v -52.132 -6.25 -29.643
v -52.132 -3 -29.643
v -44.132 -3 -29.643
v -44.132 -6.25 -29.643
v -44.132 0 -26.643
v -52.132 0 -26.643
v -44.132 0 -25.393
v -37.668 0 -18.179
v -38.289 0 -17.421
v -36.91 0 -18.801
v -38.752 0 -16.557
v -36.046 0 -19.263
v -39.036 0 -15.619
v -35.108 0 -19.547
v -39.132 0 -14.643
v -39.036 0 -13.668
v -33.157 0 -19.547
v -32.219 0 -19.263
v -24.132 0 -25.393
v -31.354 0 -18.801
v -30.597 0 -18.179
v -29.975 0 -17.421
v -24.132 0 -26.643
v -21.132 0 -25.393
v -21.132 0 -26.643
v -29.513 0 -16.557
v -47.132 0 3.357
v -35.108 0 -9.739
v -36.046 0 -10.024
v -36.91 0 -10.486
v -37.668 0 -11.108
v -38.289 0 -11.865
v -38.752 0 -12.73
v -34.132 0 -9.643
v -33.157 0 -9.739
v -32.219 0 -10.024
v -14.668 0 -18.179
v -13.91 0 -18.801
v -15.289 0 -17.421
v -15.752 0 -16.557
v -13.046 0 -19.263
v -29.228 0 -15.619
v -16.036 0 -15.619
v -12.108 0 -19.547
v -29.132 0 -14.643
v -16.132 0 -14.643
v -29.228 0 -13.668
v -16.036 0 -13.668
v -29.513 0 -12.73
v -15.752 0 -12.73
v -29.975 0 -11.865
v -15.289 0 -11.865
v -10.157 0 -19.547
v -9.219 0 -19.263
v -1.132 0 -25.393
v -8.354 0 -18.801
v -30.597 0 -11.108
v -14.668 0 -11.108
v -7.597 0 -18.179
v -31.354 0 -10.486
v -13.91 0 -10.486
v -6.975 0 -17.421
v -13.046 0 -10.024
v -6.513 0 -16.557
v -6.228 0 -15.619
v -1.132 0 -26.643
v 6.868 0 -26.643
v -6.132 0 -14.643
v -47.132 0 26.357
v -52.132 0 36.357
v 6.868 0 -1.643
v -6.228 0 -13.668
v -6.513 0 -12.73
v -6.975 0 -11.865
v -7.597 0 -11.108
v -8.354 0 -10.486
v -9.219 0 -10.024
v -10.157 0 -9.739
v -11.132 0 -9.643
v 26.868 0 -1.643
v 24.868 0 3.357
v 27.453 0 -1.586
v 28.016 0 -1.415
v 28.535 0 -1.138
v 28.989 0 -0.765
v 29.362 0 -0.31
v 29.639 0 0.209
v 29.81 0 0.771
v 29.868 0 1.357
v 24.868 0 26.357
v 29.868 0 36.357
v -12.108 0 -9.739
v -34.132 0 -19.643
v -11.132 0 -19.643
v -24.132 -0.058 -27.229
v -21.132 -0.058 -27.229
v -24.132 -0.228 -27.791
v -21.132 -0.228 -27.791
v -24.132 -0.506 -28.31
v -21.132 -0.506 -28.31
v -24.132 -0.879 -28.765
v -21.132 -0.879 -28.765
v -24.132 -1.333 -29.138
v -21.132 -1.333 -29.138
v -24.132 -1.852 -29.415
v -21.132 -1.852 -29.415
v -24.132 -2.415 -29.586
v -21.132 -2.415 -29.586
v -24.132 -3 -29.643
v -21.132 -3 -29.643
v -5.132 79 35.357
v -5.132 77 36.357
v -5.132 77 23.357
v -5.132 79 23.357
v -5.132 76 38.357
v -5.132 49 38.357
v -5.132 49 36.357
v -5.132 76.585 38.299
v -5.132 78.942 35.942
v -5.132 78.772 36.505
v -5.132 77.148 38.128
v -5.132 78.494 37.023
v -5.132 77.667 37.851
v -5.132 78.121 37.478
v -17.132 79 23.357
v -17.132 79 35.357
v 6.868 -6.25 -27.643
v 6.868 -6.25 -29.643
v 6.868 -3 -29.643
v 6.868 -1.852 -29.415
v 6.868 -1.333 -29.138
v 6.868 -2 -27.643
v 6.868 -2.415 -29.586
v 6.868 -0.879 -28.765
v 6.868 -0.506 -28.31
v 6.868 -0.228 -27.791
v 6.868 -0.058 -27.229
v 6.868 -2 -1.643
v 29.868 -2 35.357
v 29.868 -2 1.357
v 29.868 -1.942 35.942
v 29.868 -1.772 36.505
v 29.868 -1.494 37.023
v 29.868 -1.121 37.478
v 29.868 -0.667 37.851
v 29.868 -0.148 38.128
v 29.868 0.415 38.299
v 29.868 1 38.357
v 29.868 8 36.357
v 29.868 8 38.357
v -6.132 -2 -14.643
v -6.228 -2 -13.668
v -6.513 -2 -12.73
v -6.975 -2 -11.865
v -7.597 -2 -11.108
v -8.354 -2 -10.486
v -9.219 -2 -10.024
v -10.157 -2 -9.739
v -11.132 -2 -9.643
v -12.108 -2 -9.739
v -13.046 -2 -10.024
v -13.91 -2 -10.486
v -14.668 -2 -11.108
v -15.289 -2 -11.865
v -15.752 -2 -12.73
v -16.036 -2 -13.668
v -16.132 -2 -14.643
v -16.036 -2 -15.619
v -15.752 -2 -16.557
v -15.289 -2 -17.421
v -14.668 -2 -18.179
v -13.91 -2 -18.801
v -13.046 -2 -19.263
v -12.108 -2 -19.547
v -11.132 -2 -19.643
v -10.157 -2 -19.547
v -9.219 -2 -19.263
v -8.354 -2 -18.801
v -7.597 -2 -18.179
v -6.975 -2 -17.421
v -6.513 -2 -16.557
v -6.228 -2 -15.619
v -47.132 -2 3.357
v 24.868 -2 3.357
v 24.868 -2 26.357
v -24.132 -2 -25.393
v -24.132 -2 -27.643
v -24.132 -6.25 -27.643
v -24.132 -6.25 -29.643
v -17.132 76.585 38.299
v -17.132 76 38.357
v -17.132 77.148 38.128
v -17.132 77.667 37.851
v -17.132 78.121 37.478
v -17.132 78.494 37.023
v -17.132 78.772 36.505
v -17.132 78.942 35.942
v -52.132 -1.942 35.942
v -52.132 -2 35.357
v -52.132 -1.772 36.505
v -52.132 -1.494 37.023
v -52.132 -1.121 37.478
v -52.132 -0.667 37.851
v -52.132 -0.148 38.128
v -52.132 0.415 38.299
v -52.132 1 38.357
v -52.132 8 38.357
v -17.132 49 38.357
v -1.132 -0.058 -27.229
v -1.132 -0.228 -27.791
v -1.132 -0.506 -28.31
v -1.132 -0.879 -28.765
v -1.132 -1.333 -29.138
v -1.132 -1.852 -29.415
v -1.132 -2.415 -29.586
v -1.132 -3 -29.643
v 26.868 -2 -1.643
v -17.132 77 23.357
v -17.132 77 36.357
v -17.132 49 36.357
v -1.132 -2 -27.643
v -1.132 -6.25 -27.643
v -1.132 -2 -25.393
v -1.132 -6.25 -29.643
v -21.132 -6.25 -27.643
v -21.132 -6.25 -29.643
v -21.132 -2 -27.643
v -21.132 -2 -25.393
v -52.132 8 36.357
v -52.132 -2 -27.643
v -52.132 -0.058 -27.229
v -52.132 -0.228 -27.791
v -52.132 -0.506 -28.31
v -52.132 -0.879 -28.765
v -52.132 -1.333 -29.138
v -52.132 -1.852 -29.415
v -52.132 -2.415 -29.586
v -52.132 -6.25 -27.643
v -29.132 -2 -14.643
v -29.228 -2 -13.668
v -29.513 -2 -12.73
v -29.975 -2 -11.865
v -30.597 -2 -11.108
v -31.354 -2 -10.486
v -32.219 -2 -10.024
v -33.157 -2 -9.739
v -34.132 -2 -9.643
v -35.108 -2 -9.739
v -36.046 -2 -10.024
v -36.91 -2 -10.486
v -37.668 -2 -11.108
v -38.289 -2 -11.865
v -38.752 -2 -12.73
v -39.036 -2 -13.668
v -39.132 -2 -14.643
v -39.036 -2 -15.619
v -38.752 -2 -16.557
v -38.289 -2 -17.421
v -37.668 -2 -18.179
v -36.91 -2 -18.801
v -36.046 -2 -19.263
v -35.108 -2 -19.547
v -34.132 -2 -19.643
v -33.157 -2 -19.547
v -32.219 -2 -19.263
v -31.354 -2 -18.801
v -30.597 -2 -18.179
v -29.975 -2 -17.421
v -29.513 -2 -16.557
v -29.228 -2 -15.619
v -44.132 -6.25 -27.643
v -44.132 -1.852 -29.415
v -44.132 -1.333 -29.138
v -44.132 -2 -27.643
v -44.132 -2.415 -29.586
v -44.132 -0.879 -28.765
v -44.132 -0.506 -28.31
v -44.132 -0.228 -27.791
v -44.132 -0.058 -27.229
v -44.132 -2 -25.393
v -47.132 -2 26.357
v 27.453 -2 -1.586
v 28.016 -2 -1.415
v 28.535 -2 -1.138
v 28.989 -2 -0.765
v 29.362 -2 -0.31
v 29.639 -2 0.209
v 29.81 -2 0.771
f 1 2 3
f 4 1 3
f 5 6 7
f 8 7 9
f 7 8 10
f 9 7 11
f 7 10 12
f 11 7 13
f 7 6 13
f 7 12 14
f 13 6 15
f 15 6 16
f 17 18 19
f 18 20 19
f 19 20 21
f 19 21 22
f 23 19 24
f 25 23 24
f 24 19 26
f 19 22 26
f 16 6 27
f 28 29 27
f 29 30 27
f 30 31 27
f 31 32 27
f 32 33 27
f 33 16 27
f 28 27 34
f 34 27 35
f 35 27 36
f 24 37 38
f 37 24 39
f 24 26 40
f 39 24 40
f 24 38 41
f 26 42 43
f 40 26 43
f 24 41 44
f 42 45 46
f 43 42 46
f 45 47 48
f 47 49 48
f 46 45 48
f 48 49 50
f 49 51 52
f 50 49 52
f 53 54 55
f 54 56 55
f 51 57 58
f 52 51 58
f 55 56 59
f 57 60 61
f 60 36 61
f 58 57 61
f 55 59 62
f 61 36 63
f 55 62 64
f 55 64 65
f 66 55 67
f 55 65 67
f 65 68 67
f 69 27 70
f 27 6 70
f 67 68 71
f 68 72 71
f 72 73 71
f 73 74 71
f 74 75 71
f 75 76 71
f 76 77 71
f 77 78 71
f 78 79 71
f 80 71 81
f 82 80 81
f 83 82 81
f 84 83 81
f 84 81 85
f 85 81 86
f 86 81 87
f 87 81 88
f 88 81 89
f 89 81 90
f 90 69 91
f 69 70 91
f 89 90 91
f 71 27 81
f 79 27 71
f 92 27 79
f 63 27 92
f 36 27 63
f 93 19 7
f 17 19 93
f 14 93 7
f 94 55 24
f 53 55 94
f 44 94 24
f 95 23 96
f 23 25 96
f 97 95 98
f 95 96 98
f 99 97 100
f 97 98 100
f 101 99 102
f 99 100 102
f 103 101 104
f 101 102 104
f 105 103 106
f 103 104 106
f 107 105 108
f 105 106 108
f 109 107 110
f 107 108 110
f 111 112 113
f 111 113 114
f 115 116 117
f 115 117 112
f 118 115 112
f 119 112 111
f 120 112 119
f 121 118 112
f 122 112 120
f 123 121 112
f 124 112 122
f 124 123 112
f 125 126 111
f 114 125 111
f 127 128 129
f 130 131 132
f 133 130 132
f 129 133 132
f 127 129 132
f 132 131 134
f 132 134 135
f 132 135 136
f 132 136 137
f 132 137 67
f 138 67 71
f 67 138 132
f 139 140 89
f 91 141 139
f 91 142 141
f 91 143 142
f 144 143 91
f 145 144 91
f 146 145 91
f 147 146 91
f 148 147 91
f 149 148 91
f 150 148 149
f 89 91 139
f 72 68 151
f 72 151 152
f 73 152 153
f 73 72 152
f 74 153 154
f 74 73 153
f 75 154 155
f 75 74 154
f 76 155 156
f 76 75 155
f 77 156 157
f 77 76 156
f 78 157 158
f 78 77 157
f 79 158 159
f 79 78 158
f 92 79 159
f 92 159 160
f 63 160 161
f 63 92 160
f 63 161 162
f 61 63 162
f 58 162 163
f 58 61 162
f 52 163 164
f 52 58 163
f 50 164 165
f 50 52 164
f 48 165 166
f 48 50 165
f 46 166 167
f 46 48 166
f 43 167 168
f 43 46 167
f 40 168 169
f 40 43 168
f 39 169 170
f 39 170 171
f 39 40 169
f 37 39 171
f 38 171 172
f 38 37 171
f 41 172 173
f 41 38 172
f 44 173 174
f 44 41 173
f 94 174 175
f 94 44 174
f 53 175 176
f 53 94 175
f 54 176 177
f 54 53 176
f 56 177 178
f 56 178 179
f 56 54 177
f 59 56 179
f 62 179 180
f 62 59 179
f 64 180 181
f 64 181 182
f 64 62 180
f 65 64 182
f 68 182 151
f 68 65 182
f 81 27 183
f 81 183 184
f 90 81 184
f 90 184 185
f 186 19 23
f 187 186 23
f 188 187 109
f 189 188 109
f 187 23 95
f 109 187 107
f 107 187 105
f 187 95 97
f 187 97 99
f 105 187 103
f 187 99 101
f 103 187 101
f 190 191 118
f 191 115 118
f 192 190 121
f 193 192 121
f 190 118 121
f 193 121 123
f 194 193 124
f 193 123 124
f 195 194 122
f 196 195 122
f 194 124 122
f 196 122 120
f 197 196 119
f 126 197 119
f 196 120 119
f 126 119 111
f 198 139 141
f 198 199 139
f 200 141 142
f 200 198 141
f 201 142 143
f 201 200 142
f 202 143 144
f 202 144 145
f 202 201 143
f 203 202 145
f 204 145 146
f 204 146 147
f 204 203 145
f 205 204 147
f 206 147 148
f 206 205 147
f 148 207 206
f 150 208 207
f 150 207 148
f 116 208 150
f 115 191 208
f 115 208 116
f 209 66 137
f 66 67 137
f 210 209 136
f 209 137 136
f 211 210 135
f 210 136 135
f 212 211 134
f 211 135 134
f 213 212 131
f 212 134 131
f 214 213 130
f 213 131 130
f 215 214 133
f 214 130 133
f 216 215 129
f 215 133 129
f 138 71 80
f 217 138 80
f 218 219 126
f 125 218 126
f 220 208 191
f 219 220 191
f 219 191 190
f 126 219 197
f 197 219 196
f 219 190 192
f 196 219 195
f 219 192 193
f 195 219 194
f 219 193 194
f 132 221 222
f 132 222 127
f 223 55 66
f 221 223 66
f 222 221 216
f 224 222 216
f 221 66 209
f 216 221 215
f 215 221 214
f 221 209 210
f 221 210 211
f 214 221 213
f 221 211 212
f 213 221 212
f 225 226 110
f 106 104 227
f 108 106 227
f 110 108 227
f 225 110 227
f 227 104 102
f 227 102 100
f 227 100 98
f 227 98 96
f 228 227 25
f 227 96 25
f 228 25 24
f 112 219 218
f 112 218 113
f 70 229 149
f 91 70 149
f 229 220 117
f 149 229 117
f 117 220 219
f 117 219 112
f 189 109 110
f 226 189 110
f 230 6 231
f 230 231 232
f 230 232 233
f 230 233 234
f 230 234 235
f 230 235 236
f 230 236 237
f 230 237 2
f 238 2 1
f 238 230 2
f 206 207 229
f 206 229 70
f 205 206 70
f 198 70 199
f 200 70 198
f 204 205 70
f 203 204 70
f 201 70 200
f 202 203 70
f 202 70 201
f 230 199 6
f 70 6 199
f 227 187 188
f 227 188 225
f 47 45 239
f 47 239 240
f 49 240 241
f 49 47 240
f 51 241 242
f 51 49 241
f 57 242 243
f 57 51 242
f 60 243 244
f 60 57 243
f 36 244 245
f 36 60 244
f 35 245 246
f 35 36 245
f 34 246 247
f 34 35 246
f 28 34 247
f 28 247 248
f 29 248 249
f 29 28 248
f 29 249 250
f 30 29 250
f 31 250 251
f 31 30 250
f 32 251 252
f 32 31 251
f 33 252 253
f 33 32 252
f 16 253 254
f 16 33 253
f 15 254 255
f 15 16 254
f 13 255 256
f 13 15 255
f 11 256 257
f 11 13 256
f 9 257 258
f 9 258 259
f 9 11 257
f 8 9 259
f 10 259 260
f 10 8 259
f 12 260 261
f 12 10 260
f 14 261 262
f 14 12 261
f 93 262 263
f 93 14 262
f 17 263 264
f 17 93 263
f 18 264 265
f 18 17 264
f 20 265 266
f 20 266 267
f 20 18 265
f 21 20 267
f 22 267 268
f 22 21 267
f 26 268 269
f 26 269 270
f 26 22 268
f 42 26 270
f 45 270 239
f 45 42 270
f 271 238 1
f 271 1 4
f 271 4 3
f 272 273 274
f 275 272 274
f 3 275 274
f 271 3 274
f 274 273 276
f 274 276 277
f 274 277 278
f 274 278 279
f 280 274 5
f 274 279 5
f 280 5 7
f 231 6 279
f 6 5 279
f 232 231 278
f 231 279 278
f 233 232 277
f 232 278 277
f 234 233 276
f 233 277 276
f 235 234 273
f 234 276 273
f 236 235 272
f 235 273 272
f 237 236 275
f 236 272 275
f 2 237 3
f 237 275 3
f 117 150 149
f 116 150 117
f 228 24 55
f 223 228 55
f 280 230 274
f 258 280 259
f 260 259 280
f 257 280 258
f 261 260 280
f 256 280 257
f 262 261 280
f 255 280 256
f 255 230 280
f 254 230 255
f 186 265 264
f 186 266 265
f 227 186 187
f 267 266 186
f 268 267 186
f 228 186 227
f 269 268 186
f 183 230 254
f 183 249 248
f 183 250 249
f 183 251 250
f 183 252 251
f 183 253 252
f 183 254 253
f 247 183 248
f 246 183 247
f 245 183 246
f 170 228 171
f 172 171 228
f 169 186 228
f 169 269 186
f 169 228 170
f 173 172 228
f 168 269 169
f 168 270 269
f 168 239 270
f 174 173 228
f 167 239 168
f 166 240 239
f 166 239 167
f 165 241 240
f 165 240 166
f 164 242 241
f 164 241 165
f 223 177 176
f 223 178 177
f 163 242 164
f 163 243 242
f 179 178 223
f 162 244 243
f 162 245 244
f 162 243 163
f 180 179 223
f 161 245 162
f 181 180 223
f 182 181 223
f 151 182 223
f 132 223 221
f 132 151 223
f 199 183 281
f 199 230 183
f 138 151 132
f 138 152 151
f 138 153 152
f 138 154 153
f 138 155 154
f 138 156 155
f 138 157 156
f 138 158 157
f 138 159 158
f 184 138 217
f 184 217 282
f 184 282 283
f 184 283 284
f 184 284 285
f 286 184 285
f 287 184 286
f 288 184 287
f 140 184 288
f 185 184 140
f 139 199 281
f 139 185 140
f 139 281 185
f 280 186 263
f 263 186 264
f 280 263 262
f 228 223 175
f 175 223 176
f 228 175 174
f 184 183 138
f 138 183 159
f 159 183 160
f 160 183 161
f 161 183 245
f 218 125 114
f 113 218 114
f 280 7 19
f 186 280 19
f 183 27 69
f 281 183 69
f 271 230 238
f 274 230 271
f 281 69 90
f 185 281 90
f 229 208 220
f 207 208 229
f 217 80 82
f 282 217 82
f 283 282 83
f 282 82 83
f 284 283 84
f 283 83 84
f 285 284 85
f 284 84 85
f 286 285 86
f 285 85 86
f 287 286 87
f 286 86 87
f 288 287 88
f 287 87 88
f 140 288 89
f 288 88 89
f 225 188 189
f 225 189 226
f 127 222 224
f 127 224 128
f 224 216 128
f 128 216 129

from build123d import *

# Parameters (mm, degrees)
F0_R     = 5
F0_W     = 72
F0_H     = 23
F1_DEPTH = 2
F0_W_2   = 8
F0_H_2   = 2
F0_W_3   = 3
F2_DEPTH = 6.25
F3_R     = 3
F5_DEPTH = 2
F4_W     = 12
F4_H     = 2
F6_DEPTH = 15
F7_R     = 3


with BuildPart() as f1:
    # F0 (on Front) → F1 (new body)
    with BuildSketch(Plane.XZ):
        with BuildLine():
            Line((29.867854, 38.356669), (-52.132146, 38.356669))
            Line((-52.132146, 38.356669), (-52.132146, -27.643331))
            Line((-52.132146, -27.643331), (-44.132146, -27.643331))
            Line((-44.132146, -27.643331), (-44.132146, -25.393331))
            Line((-44.132146, -25.393331), (-24.132146, -25.393331))
            Line((-24.132146, -25.393331), (-24.132146, -27.643331))
            Line((-24.132146, -27.643331), (-21.132146, -27.643331))
            Line((-21.132146, -27.643331), (-21.132146, -25.393331))
            Line((-21.132146, -25.393331), (-1.132146, -25.393331))
            Line((-1.132146, -25.393331), (-1.132146, -27.643331))
            Line((-1.132146, -27.643331), (6.867854, -27.643331))
            Line((6.867854, -27.643331), (6.867854, -1.643331))
            Line((6.867854, -1.643331), (26.867854, -1.643331))
            ThreePointArc((26.867854, -1.643331), (28.989174, -0.764651), (29.867854, 1.356669))
            Line((29.867854, 1.356669), (29.867854, 38.356669))
        make_face()
        with Locations((-34.132146, -14.643331)):
            Circle(F0_R, mode=Mode.SUBTRACT)
        with Locations((-11.132146, -14.643331)):
            Circle(F0_R, mode=Mode.SUBTRACT)
        with Locations((-11.132146, 14.856669)):
            Rectangle(F0_W, F0_H, mode=Mode.SUBTRACT)
    extrude(amount=F1_DEPTH)

    # F0 (on Front) → F2 (join)
    with BuildSketch(Plane.XZ):
        with Locations((-48.132146, -28.643331)):
            Rectangle(F0_W_2, F0_H_2)
        with Locations((-22.632146, -28.643331)):
            Rectangle(F0_W_3, F0_H_2)
        with Locations((2.867854, -28.643331)):
            Rectangle(F0_W_2, F0_H_2)
    extrude(amount=F2_DEPTH)

    # F3
    f3_edges = [f1.edges().sort_by_distance(p)[0] for p in [
        (-48.132146, 0, -29.643331),
        (-22.632146, 0, -29.643331),
        (2.867854, 0, -29.643331),
    ]]
    fillet(f3_edges, radius=F3_R)

    # F4 (on face) → F5 (join)
    with BuildSketch(Plane.XY.offset(38.356669)):
        Polygon((-52.132146, 8), (-52.132146, 0), (29.867854, 0), (29.867854, 8), (-5.132146, 49), (-5.132146, 77), (-17.132146, 77), (-17.132146, 49), align=None)
    extrude(amount=-F5_DEPTH)

    # F4 (on face) → F6 (join)
    with BuildSketch(Plane.XY.offset(38.356669)):
        with Locations((-11.132146, 78)):
            Rectangle(F4_W, F4_H)
    extrude(amount=-F6_DEPTH)

    # F7
    f7_edges = [f1.edges().sort_by_distance(p)[0] for p in [
        (-11.132146, 79, 38.356669),
        (-11.132146, -2, 38.356669),
    ]]
    fillet(f7_edges, radius=F7_R)


solid = f1.part
